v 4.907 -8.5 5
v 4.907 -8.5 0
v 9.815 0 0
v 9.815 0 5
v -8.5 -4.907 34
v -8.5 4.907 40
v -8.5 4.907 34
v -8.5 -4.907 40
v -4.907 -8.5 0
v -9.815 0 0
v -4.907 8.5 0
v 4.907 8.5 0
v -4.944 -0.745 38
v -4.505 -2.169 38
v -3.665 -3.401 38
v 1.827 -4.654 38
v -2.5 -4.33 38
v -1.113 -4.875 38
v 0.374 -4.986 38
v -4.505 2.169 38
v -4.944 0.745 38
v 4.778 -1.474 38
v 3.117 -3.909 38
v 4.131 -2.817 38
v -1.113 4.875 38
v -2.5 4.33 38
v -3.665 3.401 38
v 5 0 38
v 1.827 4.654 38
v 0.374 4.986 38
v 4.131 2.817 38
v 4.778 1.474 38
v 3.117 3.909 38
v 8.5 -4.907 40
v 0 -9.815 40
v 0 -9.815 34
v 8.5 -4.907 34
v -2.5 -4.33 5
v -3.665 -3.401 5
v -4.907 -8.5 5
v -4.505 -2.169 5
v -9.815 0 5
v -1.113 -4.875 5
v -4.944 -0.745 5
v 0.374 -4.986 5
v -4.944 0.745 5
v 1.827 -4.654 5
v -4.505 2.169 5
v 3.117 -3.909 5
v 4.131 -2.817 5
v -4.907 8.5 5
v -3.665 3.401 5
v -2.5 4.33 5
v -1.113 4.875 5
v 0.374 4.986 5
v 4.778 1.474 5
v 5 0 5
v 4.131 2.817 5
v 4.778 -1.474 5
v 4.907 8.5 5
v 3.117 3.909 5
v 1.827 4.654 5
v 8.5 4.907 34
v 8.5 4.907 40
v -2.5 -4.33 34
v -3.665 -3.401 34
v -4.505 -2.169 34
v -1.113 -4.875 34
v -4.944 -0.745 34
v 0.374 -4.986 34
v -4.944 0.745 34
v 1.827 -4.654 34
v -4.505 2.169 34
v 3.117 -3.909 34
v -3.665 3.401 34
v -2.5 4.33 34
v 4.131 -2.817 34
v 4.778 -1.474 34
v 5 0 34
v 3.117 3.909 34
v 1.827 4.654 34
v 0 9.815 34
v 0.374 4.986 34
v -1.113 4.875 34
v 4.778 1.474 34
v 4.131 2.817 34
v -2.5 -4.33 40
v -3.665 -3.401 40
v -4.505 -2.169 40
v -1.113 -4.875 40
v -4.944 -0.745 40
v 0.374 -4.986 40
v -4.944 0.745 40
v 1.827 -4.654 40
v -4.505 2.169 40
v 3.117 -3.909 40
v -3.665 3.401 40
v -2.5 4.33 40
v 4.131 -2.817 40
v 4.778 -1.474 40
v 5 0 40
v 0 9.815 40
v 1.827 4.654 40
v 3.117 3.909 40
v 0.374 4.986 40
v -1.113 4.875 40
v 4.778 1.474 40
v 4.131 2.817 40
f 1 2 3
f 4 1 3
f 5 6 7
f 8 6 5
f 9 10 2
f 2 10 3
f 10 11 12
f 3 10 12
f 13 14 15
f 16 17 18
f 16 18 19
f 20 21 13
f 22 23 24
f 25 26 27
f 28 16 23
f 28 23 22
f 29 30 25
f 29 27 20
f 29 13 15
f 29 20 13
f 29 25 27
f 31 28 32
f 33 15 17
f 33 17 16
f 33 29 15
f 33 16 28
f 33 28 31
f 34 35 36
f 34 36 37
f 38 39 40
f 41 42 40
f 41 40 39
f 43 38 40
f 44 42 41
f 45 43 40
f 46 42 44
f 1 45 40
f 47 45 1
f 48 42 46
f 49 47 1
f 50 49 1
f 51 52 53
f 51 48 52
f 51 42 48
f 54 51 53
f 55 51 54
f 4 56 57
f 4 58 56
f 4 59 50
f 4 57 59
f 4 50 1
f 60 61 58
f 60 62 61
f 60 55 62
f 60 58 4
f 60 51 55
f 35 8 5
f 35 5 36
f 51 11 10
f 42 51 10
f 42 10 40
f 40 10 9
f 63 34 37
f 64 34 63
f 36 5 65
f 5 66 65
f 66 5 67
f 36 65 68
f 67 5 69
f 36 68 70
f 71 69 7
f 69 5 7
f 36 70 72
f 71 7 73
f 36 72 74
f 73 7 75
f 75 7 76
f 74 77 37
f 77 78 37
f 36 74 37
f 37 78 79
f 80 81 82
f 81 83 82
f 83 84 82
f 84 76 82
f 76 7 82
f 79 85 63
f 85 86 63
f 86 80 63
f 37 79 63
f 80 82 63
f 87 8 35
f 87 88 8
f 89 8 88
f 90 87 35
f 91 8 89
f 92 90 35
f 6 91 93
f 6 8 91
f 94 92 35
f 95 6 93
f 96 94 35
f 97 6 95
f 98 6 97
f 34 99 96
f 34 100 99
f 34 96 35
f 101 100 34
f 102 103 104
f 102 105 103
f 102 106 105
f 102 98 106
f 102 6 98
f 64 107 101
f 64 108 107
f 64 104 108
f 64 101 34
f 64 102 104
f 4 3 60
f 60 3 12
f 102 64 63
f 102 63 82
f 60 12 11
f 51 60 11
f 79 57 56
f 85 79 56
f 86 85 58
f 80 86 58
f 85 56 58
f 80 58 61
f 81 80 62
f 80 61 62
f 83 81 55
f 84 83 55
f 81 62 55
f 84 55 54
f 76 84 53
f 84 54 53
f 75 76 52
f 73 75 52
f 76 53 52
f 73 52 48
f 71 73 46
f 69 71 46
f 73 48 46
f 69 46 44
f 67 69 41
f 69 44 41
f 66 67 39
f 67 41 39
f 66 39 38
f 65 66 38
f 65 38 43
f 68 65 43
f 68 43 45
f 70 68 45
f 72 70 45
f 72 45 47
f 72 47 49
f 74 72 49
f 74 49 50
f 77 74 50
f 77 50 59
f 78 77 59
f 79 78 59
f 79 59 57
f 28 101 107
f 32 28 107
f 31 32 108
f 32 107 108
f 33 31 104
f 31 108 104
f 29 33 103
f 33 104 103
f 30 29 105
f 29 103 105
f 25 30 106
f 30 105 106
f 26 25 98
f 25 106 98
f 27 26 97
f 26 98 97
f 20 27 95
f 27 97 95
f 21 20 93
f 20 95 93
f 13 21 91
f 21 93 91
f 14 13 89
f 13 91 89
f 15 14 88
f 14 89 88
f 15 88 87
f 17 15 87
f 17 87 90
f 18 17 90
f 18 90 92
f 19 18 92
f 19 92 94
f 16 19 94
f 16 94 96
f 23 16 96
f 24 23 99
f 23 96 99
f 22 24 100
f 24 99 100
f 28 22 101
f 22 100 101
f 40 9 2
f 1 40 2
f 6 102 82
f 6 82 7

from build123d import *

# Parameters (mm, degrees)
F1_DEPTH = 5
F2_R     = 5
F3_DEPTH = 35
F4_R     = 5
F5_DEPTH = 6
F6_R     = 5
F7_DEPTH = 2


with BuildPart() as f1:
    # F0 (on Top) → F1 (new body)
    with BuildSketch(Plane.XY):
        Polygon((4.9074772881, 8.5), (-4.9074772881, 8.5), (-9.8149545762, 0), (-4.9074772881, -8.5), (4.9074772881, -8.5), (9.8149545762, 0), align=None)
    extrude(amount=F1_DEPTH)

    # F2 (on face) → F3 (join)
    with BuildSketch(Plane.XY.offset(5)):
        Circle(F2_R)
    extrude(amount=F3_DEPTH)

    # F4 (on face) → F5 (join)
    with BuildSketch(Plane.XY.offset(40)):
        Polygon((-8.5, 4.9074772881), (-8.5, -4.9074772881), (0, -9.8149545762), (8.5, -4.9074772881), (8.5, 4.9074772881), (0, 9.8149545762), align=None)
        Circle(F4_R, mode=Mode.SUBTRACT)
    extrude(amount=-F5_DEPTH)

    # F6 (on face) → F7 (cut)
    with BuildSketch(Plane.XY.offset(40)):
        Circle(F6_R)
    extrude(amount=-F7_DEPTH, mode=Mode.SUBTRACT)


solid = f1.part
